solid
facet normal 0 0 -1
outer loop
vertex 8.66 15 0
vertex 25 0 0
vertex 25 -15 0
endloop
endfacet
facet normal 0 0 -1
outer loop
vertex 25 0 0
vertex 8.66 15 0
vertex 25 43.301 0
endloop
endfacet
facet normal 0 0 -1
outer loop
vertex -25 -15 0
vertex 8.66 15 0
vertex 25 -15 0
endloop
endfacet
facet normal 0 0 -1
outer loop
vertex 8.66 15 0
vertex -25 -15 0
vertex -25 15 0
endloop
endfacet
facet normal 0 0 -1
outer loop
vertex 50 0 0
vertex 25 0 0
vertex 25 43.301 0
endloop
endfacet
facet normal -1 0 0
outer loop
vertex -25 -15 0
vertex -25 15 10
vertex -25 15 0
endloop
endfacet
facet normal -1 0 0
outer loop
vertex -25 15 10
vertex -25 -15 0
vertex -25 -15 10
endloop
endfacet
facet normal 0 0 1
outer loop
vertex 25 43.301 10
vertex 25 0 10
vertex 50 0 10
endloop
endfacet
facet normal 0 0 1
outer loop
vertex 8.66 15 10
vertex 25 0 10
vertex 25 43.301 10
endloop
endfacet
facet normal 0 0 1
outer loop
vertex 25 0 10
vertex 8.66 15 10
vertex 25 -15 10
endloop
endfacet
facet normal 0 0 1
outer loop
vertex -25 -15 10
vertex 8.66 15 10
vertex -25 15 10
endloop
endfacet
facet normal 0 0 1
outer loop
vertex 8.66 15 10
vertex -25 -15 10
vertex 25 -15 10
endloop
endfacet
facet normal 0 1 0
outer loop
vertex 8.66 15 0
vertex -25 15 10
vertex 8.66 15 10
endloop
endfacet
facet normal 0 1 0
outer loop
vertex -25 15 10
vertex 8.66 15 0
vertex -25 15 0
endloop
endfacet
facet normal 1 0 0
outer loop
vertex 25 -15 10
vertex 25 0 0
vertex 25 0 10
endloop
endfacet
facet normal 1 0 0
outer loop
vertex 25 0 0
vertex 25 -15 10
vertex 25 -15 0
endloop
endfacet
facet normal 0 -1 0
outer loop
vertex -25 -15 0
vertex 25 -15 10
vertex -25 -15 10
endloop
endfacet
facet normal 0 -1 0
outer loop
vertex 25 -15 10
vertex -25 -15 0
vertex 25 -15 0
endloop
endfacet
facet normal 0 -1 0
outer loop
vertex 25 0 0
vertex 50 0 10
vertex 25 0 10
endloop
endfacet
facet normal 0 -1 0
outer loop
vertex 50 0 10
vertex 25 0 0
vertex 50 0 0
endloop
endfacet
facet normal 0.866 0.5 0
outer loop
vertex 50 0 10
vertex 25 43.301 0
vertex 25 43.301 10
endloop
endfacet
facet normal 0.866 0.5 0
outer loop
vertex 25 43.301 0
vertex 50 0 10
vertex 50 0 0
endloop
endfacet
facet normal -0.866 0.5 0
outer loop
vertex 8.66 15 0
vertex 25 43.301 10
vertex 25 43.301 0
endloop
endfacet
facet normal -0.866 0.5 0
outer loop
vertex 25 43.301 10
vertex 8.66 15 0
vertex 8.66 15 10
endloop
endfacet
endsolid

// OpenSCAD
linear_extrude(height = 10)
    square([50, 30], center = true);
side = 50;
height = 10;

module equilateral_triangle(s) {
    polygon(points = [
        [0, 0],
        [s, 0],
        [s/2, s * sqrt(3)/2]
    ]);
}

linear_extrude(height = height)
    equilateral_triangle(side);
